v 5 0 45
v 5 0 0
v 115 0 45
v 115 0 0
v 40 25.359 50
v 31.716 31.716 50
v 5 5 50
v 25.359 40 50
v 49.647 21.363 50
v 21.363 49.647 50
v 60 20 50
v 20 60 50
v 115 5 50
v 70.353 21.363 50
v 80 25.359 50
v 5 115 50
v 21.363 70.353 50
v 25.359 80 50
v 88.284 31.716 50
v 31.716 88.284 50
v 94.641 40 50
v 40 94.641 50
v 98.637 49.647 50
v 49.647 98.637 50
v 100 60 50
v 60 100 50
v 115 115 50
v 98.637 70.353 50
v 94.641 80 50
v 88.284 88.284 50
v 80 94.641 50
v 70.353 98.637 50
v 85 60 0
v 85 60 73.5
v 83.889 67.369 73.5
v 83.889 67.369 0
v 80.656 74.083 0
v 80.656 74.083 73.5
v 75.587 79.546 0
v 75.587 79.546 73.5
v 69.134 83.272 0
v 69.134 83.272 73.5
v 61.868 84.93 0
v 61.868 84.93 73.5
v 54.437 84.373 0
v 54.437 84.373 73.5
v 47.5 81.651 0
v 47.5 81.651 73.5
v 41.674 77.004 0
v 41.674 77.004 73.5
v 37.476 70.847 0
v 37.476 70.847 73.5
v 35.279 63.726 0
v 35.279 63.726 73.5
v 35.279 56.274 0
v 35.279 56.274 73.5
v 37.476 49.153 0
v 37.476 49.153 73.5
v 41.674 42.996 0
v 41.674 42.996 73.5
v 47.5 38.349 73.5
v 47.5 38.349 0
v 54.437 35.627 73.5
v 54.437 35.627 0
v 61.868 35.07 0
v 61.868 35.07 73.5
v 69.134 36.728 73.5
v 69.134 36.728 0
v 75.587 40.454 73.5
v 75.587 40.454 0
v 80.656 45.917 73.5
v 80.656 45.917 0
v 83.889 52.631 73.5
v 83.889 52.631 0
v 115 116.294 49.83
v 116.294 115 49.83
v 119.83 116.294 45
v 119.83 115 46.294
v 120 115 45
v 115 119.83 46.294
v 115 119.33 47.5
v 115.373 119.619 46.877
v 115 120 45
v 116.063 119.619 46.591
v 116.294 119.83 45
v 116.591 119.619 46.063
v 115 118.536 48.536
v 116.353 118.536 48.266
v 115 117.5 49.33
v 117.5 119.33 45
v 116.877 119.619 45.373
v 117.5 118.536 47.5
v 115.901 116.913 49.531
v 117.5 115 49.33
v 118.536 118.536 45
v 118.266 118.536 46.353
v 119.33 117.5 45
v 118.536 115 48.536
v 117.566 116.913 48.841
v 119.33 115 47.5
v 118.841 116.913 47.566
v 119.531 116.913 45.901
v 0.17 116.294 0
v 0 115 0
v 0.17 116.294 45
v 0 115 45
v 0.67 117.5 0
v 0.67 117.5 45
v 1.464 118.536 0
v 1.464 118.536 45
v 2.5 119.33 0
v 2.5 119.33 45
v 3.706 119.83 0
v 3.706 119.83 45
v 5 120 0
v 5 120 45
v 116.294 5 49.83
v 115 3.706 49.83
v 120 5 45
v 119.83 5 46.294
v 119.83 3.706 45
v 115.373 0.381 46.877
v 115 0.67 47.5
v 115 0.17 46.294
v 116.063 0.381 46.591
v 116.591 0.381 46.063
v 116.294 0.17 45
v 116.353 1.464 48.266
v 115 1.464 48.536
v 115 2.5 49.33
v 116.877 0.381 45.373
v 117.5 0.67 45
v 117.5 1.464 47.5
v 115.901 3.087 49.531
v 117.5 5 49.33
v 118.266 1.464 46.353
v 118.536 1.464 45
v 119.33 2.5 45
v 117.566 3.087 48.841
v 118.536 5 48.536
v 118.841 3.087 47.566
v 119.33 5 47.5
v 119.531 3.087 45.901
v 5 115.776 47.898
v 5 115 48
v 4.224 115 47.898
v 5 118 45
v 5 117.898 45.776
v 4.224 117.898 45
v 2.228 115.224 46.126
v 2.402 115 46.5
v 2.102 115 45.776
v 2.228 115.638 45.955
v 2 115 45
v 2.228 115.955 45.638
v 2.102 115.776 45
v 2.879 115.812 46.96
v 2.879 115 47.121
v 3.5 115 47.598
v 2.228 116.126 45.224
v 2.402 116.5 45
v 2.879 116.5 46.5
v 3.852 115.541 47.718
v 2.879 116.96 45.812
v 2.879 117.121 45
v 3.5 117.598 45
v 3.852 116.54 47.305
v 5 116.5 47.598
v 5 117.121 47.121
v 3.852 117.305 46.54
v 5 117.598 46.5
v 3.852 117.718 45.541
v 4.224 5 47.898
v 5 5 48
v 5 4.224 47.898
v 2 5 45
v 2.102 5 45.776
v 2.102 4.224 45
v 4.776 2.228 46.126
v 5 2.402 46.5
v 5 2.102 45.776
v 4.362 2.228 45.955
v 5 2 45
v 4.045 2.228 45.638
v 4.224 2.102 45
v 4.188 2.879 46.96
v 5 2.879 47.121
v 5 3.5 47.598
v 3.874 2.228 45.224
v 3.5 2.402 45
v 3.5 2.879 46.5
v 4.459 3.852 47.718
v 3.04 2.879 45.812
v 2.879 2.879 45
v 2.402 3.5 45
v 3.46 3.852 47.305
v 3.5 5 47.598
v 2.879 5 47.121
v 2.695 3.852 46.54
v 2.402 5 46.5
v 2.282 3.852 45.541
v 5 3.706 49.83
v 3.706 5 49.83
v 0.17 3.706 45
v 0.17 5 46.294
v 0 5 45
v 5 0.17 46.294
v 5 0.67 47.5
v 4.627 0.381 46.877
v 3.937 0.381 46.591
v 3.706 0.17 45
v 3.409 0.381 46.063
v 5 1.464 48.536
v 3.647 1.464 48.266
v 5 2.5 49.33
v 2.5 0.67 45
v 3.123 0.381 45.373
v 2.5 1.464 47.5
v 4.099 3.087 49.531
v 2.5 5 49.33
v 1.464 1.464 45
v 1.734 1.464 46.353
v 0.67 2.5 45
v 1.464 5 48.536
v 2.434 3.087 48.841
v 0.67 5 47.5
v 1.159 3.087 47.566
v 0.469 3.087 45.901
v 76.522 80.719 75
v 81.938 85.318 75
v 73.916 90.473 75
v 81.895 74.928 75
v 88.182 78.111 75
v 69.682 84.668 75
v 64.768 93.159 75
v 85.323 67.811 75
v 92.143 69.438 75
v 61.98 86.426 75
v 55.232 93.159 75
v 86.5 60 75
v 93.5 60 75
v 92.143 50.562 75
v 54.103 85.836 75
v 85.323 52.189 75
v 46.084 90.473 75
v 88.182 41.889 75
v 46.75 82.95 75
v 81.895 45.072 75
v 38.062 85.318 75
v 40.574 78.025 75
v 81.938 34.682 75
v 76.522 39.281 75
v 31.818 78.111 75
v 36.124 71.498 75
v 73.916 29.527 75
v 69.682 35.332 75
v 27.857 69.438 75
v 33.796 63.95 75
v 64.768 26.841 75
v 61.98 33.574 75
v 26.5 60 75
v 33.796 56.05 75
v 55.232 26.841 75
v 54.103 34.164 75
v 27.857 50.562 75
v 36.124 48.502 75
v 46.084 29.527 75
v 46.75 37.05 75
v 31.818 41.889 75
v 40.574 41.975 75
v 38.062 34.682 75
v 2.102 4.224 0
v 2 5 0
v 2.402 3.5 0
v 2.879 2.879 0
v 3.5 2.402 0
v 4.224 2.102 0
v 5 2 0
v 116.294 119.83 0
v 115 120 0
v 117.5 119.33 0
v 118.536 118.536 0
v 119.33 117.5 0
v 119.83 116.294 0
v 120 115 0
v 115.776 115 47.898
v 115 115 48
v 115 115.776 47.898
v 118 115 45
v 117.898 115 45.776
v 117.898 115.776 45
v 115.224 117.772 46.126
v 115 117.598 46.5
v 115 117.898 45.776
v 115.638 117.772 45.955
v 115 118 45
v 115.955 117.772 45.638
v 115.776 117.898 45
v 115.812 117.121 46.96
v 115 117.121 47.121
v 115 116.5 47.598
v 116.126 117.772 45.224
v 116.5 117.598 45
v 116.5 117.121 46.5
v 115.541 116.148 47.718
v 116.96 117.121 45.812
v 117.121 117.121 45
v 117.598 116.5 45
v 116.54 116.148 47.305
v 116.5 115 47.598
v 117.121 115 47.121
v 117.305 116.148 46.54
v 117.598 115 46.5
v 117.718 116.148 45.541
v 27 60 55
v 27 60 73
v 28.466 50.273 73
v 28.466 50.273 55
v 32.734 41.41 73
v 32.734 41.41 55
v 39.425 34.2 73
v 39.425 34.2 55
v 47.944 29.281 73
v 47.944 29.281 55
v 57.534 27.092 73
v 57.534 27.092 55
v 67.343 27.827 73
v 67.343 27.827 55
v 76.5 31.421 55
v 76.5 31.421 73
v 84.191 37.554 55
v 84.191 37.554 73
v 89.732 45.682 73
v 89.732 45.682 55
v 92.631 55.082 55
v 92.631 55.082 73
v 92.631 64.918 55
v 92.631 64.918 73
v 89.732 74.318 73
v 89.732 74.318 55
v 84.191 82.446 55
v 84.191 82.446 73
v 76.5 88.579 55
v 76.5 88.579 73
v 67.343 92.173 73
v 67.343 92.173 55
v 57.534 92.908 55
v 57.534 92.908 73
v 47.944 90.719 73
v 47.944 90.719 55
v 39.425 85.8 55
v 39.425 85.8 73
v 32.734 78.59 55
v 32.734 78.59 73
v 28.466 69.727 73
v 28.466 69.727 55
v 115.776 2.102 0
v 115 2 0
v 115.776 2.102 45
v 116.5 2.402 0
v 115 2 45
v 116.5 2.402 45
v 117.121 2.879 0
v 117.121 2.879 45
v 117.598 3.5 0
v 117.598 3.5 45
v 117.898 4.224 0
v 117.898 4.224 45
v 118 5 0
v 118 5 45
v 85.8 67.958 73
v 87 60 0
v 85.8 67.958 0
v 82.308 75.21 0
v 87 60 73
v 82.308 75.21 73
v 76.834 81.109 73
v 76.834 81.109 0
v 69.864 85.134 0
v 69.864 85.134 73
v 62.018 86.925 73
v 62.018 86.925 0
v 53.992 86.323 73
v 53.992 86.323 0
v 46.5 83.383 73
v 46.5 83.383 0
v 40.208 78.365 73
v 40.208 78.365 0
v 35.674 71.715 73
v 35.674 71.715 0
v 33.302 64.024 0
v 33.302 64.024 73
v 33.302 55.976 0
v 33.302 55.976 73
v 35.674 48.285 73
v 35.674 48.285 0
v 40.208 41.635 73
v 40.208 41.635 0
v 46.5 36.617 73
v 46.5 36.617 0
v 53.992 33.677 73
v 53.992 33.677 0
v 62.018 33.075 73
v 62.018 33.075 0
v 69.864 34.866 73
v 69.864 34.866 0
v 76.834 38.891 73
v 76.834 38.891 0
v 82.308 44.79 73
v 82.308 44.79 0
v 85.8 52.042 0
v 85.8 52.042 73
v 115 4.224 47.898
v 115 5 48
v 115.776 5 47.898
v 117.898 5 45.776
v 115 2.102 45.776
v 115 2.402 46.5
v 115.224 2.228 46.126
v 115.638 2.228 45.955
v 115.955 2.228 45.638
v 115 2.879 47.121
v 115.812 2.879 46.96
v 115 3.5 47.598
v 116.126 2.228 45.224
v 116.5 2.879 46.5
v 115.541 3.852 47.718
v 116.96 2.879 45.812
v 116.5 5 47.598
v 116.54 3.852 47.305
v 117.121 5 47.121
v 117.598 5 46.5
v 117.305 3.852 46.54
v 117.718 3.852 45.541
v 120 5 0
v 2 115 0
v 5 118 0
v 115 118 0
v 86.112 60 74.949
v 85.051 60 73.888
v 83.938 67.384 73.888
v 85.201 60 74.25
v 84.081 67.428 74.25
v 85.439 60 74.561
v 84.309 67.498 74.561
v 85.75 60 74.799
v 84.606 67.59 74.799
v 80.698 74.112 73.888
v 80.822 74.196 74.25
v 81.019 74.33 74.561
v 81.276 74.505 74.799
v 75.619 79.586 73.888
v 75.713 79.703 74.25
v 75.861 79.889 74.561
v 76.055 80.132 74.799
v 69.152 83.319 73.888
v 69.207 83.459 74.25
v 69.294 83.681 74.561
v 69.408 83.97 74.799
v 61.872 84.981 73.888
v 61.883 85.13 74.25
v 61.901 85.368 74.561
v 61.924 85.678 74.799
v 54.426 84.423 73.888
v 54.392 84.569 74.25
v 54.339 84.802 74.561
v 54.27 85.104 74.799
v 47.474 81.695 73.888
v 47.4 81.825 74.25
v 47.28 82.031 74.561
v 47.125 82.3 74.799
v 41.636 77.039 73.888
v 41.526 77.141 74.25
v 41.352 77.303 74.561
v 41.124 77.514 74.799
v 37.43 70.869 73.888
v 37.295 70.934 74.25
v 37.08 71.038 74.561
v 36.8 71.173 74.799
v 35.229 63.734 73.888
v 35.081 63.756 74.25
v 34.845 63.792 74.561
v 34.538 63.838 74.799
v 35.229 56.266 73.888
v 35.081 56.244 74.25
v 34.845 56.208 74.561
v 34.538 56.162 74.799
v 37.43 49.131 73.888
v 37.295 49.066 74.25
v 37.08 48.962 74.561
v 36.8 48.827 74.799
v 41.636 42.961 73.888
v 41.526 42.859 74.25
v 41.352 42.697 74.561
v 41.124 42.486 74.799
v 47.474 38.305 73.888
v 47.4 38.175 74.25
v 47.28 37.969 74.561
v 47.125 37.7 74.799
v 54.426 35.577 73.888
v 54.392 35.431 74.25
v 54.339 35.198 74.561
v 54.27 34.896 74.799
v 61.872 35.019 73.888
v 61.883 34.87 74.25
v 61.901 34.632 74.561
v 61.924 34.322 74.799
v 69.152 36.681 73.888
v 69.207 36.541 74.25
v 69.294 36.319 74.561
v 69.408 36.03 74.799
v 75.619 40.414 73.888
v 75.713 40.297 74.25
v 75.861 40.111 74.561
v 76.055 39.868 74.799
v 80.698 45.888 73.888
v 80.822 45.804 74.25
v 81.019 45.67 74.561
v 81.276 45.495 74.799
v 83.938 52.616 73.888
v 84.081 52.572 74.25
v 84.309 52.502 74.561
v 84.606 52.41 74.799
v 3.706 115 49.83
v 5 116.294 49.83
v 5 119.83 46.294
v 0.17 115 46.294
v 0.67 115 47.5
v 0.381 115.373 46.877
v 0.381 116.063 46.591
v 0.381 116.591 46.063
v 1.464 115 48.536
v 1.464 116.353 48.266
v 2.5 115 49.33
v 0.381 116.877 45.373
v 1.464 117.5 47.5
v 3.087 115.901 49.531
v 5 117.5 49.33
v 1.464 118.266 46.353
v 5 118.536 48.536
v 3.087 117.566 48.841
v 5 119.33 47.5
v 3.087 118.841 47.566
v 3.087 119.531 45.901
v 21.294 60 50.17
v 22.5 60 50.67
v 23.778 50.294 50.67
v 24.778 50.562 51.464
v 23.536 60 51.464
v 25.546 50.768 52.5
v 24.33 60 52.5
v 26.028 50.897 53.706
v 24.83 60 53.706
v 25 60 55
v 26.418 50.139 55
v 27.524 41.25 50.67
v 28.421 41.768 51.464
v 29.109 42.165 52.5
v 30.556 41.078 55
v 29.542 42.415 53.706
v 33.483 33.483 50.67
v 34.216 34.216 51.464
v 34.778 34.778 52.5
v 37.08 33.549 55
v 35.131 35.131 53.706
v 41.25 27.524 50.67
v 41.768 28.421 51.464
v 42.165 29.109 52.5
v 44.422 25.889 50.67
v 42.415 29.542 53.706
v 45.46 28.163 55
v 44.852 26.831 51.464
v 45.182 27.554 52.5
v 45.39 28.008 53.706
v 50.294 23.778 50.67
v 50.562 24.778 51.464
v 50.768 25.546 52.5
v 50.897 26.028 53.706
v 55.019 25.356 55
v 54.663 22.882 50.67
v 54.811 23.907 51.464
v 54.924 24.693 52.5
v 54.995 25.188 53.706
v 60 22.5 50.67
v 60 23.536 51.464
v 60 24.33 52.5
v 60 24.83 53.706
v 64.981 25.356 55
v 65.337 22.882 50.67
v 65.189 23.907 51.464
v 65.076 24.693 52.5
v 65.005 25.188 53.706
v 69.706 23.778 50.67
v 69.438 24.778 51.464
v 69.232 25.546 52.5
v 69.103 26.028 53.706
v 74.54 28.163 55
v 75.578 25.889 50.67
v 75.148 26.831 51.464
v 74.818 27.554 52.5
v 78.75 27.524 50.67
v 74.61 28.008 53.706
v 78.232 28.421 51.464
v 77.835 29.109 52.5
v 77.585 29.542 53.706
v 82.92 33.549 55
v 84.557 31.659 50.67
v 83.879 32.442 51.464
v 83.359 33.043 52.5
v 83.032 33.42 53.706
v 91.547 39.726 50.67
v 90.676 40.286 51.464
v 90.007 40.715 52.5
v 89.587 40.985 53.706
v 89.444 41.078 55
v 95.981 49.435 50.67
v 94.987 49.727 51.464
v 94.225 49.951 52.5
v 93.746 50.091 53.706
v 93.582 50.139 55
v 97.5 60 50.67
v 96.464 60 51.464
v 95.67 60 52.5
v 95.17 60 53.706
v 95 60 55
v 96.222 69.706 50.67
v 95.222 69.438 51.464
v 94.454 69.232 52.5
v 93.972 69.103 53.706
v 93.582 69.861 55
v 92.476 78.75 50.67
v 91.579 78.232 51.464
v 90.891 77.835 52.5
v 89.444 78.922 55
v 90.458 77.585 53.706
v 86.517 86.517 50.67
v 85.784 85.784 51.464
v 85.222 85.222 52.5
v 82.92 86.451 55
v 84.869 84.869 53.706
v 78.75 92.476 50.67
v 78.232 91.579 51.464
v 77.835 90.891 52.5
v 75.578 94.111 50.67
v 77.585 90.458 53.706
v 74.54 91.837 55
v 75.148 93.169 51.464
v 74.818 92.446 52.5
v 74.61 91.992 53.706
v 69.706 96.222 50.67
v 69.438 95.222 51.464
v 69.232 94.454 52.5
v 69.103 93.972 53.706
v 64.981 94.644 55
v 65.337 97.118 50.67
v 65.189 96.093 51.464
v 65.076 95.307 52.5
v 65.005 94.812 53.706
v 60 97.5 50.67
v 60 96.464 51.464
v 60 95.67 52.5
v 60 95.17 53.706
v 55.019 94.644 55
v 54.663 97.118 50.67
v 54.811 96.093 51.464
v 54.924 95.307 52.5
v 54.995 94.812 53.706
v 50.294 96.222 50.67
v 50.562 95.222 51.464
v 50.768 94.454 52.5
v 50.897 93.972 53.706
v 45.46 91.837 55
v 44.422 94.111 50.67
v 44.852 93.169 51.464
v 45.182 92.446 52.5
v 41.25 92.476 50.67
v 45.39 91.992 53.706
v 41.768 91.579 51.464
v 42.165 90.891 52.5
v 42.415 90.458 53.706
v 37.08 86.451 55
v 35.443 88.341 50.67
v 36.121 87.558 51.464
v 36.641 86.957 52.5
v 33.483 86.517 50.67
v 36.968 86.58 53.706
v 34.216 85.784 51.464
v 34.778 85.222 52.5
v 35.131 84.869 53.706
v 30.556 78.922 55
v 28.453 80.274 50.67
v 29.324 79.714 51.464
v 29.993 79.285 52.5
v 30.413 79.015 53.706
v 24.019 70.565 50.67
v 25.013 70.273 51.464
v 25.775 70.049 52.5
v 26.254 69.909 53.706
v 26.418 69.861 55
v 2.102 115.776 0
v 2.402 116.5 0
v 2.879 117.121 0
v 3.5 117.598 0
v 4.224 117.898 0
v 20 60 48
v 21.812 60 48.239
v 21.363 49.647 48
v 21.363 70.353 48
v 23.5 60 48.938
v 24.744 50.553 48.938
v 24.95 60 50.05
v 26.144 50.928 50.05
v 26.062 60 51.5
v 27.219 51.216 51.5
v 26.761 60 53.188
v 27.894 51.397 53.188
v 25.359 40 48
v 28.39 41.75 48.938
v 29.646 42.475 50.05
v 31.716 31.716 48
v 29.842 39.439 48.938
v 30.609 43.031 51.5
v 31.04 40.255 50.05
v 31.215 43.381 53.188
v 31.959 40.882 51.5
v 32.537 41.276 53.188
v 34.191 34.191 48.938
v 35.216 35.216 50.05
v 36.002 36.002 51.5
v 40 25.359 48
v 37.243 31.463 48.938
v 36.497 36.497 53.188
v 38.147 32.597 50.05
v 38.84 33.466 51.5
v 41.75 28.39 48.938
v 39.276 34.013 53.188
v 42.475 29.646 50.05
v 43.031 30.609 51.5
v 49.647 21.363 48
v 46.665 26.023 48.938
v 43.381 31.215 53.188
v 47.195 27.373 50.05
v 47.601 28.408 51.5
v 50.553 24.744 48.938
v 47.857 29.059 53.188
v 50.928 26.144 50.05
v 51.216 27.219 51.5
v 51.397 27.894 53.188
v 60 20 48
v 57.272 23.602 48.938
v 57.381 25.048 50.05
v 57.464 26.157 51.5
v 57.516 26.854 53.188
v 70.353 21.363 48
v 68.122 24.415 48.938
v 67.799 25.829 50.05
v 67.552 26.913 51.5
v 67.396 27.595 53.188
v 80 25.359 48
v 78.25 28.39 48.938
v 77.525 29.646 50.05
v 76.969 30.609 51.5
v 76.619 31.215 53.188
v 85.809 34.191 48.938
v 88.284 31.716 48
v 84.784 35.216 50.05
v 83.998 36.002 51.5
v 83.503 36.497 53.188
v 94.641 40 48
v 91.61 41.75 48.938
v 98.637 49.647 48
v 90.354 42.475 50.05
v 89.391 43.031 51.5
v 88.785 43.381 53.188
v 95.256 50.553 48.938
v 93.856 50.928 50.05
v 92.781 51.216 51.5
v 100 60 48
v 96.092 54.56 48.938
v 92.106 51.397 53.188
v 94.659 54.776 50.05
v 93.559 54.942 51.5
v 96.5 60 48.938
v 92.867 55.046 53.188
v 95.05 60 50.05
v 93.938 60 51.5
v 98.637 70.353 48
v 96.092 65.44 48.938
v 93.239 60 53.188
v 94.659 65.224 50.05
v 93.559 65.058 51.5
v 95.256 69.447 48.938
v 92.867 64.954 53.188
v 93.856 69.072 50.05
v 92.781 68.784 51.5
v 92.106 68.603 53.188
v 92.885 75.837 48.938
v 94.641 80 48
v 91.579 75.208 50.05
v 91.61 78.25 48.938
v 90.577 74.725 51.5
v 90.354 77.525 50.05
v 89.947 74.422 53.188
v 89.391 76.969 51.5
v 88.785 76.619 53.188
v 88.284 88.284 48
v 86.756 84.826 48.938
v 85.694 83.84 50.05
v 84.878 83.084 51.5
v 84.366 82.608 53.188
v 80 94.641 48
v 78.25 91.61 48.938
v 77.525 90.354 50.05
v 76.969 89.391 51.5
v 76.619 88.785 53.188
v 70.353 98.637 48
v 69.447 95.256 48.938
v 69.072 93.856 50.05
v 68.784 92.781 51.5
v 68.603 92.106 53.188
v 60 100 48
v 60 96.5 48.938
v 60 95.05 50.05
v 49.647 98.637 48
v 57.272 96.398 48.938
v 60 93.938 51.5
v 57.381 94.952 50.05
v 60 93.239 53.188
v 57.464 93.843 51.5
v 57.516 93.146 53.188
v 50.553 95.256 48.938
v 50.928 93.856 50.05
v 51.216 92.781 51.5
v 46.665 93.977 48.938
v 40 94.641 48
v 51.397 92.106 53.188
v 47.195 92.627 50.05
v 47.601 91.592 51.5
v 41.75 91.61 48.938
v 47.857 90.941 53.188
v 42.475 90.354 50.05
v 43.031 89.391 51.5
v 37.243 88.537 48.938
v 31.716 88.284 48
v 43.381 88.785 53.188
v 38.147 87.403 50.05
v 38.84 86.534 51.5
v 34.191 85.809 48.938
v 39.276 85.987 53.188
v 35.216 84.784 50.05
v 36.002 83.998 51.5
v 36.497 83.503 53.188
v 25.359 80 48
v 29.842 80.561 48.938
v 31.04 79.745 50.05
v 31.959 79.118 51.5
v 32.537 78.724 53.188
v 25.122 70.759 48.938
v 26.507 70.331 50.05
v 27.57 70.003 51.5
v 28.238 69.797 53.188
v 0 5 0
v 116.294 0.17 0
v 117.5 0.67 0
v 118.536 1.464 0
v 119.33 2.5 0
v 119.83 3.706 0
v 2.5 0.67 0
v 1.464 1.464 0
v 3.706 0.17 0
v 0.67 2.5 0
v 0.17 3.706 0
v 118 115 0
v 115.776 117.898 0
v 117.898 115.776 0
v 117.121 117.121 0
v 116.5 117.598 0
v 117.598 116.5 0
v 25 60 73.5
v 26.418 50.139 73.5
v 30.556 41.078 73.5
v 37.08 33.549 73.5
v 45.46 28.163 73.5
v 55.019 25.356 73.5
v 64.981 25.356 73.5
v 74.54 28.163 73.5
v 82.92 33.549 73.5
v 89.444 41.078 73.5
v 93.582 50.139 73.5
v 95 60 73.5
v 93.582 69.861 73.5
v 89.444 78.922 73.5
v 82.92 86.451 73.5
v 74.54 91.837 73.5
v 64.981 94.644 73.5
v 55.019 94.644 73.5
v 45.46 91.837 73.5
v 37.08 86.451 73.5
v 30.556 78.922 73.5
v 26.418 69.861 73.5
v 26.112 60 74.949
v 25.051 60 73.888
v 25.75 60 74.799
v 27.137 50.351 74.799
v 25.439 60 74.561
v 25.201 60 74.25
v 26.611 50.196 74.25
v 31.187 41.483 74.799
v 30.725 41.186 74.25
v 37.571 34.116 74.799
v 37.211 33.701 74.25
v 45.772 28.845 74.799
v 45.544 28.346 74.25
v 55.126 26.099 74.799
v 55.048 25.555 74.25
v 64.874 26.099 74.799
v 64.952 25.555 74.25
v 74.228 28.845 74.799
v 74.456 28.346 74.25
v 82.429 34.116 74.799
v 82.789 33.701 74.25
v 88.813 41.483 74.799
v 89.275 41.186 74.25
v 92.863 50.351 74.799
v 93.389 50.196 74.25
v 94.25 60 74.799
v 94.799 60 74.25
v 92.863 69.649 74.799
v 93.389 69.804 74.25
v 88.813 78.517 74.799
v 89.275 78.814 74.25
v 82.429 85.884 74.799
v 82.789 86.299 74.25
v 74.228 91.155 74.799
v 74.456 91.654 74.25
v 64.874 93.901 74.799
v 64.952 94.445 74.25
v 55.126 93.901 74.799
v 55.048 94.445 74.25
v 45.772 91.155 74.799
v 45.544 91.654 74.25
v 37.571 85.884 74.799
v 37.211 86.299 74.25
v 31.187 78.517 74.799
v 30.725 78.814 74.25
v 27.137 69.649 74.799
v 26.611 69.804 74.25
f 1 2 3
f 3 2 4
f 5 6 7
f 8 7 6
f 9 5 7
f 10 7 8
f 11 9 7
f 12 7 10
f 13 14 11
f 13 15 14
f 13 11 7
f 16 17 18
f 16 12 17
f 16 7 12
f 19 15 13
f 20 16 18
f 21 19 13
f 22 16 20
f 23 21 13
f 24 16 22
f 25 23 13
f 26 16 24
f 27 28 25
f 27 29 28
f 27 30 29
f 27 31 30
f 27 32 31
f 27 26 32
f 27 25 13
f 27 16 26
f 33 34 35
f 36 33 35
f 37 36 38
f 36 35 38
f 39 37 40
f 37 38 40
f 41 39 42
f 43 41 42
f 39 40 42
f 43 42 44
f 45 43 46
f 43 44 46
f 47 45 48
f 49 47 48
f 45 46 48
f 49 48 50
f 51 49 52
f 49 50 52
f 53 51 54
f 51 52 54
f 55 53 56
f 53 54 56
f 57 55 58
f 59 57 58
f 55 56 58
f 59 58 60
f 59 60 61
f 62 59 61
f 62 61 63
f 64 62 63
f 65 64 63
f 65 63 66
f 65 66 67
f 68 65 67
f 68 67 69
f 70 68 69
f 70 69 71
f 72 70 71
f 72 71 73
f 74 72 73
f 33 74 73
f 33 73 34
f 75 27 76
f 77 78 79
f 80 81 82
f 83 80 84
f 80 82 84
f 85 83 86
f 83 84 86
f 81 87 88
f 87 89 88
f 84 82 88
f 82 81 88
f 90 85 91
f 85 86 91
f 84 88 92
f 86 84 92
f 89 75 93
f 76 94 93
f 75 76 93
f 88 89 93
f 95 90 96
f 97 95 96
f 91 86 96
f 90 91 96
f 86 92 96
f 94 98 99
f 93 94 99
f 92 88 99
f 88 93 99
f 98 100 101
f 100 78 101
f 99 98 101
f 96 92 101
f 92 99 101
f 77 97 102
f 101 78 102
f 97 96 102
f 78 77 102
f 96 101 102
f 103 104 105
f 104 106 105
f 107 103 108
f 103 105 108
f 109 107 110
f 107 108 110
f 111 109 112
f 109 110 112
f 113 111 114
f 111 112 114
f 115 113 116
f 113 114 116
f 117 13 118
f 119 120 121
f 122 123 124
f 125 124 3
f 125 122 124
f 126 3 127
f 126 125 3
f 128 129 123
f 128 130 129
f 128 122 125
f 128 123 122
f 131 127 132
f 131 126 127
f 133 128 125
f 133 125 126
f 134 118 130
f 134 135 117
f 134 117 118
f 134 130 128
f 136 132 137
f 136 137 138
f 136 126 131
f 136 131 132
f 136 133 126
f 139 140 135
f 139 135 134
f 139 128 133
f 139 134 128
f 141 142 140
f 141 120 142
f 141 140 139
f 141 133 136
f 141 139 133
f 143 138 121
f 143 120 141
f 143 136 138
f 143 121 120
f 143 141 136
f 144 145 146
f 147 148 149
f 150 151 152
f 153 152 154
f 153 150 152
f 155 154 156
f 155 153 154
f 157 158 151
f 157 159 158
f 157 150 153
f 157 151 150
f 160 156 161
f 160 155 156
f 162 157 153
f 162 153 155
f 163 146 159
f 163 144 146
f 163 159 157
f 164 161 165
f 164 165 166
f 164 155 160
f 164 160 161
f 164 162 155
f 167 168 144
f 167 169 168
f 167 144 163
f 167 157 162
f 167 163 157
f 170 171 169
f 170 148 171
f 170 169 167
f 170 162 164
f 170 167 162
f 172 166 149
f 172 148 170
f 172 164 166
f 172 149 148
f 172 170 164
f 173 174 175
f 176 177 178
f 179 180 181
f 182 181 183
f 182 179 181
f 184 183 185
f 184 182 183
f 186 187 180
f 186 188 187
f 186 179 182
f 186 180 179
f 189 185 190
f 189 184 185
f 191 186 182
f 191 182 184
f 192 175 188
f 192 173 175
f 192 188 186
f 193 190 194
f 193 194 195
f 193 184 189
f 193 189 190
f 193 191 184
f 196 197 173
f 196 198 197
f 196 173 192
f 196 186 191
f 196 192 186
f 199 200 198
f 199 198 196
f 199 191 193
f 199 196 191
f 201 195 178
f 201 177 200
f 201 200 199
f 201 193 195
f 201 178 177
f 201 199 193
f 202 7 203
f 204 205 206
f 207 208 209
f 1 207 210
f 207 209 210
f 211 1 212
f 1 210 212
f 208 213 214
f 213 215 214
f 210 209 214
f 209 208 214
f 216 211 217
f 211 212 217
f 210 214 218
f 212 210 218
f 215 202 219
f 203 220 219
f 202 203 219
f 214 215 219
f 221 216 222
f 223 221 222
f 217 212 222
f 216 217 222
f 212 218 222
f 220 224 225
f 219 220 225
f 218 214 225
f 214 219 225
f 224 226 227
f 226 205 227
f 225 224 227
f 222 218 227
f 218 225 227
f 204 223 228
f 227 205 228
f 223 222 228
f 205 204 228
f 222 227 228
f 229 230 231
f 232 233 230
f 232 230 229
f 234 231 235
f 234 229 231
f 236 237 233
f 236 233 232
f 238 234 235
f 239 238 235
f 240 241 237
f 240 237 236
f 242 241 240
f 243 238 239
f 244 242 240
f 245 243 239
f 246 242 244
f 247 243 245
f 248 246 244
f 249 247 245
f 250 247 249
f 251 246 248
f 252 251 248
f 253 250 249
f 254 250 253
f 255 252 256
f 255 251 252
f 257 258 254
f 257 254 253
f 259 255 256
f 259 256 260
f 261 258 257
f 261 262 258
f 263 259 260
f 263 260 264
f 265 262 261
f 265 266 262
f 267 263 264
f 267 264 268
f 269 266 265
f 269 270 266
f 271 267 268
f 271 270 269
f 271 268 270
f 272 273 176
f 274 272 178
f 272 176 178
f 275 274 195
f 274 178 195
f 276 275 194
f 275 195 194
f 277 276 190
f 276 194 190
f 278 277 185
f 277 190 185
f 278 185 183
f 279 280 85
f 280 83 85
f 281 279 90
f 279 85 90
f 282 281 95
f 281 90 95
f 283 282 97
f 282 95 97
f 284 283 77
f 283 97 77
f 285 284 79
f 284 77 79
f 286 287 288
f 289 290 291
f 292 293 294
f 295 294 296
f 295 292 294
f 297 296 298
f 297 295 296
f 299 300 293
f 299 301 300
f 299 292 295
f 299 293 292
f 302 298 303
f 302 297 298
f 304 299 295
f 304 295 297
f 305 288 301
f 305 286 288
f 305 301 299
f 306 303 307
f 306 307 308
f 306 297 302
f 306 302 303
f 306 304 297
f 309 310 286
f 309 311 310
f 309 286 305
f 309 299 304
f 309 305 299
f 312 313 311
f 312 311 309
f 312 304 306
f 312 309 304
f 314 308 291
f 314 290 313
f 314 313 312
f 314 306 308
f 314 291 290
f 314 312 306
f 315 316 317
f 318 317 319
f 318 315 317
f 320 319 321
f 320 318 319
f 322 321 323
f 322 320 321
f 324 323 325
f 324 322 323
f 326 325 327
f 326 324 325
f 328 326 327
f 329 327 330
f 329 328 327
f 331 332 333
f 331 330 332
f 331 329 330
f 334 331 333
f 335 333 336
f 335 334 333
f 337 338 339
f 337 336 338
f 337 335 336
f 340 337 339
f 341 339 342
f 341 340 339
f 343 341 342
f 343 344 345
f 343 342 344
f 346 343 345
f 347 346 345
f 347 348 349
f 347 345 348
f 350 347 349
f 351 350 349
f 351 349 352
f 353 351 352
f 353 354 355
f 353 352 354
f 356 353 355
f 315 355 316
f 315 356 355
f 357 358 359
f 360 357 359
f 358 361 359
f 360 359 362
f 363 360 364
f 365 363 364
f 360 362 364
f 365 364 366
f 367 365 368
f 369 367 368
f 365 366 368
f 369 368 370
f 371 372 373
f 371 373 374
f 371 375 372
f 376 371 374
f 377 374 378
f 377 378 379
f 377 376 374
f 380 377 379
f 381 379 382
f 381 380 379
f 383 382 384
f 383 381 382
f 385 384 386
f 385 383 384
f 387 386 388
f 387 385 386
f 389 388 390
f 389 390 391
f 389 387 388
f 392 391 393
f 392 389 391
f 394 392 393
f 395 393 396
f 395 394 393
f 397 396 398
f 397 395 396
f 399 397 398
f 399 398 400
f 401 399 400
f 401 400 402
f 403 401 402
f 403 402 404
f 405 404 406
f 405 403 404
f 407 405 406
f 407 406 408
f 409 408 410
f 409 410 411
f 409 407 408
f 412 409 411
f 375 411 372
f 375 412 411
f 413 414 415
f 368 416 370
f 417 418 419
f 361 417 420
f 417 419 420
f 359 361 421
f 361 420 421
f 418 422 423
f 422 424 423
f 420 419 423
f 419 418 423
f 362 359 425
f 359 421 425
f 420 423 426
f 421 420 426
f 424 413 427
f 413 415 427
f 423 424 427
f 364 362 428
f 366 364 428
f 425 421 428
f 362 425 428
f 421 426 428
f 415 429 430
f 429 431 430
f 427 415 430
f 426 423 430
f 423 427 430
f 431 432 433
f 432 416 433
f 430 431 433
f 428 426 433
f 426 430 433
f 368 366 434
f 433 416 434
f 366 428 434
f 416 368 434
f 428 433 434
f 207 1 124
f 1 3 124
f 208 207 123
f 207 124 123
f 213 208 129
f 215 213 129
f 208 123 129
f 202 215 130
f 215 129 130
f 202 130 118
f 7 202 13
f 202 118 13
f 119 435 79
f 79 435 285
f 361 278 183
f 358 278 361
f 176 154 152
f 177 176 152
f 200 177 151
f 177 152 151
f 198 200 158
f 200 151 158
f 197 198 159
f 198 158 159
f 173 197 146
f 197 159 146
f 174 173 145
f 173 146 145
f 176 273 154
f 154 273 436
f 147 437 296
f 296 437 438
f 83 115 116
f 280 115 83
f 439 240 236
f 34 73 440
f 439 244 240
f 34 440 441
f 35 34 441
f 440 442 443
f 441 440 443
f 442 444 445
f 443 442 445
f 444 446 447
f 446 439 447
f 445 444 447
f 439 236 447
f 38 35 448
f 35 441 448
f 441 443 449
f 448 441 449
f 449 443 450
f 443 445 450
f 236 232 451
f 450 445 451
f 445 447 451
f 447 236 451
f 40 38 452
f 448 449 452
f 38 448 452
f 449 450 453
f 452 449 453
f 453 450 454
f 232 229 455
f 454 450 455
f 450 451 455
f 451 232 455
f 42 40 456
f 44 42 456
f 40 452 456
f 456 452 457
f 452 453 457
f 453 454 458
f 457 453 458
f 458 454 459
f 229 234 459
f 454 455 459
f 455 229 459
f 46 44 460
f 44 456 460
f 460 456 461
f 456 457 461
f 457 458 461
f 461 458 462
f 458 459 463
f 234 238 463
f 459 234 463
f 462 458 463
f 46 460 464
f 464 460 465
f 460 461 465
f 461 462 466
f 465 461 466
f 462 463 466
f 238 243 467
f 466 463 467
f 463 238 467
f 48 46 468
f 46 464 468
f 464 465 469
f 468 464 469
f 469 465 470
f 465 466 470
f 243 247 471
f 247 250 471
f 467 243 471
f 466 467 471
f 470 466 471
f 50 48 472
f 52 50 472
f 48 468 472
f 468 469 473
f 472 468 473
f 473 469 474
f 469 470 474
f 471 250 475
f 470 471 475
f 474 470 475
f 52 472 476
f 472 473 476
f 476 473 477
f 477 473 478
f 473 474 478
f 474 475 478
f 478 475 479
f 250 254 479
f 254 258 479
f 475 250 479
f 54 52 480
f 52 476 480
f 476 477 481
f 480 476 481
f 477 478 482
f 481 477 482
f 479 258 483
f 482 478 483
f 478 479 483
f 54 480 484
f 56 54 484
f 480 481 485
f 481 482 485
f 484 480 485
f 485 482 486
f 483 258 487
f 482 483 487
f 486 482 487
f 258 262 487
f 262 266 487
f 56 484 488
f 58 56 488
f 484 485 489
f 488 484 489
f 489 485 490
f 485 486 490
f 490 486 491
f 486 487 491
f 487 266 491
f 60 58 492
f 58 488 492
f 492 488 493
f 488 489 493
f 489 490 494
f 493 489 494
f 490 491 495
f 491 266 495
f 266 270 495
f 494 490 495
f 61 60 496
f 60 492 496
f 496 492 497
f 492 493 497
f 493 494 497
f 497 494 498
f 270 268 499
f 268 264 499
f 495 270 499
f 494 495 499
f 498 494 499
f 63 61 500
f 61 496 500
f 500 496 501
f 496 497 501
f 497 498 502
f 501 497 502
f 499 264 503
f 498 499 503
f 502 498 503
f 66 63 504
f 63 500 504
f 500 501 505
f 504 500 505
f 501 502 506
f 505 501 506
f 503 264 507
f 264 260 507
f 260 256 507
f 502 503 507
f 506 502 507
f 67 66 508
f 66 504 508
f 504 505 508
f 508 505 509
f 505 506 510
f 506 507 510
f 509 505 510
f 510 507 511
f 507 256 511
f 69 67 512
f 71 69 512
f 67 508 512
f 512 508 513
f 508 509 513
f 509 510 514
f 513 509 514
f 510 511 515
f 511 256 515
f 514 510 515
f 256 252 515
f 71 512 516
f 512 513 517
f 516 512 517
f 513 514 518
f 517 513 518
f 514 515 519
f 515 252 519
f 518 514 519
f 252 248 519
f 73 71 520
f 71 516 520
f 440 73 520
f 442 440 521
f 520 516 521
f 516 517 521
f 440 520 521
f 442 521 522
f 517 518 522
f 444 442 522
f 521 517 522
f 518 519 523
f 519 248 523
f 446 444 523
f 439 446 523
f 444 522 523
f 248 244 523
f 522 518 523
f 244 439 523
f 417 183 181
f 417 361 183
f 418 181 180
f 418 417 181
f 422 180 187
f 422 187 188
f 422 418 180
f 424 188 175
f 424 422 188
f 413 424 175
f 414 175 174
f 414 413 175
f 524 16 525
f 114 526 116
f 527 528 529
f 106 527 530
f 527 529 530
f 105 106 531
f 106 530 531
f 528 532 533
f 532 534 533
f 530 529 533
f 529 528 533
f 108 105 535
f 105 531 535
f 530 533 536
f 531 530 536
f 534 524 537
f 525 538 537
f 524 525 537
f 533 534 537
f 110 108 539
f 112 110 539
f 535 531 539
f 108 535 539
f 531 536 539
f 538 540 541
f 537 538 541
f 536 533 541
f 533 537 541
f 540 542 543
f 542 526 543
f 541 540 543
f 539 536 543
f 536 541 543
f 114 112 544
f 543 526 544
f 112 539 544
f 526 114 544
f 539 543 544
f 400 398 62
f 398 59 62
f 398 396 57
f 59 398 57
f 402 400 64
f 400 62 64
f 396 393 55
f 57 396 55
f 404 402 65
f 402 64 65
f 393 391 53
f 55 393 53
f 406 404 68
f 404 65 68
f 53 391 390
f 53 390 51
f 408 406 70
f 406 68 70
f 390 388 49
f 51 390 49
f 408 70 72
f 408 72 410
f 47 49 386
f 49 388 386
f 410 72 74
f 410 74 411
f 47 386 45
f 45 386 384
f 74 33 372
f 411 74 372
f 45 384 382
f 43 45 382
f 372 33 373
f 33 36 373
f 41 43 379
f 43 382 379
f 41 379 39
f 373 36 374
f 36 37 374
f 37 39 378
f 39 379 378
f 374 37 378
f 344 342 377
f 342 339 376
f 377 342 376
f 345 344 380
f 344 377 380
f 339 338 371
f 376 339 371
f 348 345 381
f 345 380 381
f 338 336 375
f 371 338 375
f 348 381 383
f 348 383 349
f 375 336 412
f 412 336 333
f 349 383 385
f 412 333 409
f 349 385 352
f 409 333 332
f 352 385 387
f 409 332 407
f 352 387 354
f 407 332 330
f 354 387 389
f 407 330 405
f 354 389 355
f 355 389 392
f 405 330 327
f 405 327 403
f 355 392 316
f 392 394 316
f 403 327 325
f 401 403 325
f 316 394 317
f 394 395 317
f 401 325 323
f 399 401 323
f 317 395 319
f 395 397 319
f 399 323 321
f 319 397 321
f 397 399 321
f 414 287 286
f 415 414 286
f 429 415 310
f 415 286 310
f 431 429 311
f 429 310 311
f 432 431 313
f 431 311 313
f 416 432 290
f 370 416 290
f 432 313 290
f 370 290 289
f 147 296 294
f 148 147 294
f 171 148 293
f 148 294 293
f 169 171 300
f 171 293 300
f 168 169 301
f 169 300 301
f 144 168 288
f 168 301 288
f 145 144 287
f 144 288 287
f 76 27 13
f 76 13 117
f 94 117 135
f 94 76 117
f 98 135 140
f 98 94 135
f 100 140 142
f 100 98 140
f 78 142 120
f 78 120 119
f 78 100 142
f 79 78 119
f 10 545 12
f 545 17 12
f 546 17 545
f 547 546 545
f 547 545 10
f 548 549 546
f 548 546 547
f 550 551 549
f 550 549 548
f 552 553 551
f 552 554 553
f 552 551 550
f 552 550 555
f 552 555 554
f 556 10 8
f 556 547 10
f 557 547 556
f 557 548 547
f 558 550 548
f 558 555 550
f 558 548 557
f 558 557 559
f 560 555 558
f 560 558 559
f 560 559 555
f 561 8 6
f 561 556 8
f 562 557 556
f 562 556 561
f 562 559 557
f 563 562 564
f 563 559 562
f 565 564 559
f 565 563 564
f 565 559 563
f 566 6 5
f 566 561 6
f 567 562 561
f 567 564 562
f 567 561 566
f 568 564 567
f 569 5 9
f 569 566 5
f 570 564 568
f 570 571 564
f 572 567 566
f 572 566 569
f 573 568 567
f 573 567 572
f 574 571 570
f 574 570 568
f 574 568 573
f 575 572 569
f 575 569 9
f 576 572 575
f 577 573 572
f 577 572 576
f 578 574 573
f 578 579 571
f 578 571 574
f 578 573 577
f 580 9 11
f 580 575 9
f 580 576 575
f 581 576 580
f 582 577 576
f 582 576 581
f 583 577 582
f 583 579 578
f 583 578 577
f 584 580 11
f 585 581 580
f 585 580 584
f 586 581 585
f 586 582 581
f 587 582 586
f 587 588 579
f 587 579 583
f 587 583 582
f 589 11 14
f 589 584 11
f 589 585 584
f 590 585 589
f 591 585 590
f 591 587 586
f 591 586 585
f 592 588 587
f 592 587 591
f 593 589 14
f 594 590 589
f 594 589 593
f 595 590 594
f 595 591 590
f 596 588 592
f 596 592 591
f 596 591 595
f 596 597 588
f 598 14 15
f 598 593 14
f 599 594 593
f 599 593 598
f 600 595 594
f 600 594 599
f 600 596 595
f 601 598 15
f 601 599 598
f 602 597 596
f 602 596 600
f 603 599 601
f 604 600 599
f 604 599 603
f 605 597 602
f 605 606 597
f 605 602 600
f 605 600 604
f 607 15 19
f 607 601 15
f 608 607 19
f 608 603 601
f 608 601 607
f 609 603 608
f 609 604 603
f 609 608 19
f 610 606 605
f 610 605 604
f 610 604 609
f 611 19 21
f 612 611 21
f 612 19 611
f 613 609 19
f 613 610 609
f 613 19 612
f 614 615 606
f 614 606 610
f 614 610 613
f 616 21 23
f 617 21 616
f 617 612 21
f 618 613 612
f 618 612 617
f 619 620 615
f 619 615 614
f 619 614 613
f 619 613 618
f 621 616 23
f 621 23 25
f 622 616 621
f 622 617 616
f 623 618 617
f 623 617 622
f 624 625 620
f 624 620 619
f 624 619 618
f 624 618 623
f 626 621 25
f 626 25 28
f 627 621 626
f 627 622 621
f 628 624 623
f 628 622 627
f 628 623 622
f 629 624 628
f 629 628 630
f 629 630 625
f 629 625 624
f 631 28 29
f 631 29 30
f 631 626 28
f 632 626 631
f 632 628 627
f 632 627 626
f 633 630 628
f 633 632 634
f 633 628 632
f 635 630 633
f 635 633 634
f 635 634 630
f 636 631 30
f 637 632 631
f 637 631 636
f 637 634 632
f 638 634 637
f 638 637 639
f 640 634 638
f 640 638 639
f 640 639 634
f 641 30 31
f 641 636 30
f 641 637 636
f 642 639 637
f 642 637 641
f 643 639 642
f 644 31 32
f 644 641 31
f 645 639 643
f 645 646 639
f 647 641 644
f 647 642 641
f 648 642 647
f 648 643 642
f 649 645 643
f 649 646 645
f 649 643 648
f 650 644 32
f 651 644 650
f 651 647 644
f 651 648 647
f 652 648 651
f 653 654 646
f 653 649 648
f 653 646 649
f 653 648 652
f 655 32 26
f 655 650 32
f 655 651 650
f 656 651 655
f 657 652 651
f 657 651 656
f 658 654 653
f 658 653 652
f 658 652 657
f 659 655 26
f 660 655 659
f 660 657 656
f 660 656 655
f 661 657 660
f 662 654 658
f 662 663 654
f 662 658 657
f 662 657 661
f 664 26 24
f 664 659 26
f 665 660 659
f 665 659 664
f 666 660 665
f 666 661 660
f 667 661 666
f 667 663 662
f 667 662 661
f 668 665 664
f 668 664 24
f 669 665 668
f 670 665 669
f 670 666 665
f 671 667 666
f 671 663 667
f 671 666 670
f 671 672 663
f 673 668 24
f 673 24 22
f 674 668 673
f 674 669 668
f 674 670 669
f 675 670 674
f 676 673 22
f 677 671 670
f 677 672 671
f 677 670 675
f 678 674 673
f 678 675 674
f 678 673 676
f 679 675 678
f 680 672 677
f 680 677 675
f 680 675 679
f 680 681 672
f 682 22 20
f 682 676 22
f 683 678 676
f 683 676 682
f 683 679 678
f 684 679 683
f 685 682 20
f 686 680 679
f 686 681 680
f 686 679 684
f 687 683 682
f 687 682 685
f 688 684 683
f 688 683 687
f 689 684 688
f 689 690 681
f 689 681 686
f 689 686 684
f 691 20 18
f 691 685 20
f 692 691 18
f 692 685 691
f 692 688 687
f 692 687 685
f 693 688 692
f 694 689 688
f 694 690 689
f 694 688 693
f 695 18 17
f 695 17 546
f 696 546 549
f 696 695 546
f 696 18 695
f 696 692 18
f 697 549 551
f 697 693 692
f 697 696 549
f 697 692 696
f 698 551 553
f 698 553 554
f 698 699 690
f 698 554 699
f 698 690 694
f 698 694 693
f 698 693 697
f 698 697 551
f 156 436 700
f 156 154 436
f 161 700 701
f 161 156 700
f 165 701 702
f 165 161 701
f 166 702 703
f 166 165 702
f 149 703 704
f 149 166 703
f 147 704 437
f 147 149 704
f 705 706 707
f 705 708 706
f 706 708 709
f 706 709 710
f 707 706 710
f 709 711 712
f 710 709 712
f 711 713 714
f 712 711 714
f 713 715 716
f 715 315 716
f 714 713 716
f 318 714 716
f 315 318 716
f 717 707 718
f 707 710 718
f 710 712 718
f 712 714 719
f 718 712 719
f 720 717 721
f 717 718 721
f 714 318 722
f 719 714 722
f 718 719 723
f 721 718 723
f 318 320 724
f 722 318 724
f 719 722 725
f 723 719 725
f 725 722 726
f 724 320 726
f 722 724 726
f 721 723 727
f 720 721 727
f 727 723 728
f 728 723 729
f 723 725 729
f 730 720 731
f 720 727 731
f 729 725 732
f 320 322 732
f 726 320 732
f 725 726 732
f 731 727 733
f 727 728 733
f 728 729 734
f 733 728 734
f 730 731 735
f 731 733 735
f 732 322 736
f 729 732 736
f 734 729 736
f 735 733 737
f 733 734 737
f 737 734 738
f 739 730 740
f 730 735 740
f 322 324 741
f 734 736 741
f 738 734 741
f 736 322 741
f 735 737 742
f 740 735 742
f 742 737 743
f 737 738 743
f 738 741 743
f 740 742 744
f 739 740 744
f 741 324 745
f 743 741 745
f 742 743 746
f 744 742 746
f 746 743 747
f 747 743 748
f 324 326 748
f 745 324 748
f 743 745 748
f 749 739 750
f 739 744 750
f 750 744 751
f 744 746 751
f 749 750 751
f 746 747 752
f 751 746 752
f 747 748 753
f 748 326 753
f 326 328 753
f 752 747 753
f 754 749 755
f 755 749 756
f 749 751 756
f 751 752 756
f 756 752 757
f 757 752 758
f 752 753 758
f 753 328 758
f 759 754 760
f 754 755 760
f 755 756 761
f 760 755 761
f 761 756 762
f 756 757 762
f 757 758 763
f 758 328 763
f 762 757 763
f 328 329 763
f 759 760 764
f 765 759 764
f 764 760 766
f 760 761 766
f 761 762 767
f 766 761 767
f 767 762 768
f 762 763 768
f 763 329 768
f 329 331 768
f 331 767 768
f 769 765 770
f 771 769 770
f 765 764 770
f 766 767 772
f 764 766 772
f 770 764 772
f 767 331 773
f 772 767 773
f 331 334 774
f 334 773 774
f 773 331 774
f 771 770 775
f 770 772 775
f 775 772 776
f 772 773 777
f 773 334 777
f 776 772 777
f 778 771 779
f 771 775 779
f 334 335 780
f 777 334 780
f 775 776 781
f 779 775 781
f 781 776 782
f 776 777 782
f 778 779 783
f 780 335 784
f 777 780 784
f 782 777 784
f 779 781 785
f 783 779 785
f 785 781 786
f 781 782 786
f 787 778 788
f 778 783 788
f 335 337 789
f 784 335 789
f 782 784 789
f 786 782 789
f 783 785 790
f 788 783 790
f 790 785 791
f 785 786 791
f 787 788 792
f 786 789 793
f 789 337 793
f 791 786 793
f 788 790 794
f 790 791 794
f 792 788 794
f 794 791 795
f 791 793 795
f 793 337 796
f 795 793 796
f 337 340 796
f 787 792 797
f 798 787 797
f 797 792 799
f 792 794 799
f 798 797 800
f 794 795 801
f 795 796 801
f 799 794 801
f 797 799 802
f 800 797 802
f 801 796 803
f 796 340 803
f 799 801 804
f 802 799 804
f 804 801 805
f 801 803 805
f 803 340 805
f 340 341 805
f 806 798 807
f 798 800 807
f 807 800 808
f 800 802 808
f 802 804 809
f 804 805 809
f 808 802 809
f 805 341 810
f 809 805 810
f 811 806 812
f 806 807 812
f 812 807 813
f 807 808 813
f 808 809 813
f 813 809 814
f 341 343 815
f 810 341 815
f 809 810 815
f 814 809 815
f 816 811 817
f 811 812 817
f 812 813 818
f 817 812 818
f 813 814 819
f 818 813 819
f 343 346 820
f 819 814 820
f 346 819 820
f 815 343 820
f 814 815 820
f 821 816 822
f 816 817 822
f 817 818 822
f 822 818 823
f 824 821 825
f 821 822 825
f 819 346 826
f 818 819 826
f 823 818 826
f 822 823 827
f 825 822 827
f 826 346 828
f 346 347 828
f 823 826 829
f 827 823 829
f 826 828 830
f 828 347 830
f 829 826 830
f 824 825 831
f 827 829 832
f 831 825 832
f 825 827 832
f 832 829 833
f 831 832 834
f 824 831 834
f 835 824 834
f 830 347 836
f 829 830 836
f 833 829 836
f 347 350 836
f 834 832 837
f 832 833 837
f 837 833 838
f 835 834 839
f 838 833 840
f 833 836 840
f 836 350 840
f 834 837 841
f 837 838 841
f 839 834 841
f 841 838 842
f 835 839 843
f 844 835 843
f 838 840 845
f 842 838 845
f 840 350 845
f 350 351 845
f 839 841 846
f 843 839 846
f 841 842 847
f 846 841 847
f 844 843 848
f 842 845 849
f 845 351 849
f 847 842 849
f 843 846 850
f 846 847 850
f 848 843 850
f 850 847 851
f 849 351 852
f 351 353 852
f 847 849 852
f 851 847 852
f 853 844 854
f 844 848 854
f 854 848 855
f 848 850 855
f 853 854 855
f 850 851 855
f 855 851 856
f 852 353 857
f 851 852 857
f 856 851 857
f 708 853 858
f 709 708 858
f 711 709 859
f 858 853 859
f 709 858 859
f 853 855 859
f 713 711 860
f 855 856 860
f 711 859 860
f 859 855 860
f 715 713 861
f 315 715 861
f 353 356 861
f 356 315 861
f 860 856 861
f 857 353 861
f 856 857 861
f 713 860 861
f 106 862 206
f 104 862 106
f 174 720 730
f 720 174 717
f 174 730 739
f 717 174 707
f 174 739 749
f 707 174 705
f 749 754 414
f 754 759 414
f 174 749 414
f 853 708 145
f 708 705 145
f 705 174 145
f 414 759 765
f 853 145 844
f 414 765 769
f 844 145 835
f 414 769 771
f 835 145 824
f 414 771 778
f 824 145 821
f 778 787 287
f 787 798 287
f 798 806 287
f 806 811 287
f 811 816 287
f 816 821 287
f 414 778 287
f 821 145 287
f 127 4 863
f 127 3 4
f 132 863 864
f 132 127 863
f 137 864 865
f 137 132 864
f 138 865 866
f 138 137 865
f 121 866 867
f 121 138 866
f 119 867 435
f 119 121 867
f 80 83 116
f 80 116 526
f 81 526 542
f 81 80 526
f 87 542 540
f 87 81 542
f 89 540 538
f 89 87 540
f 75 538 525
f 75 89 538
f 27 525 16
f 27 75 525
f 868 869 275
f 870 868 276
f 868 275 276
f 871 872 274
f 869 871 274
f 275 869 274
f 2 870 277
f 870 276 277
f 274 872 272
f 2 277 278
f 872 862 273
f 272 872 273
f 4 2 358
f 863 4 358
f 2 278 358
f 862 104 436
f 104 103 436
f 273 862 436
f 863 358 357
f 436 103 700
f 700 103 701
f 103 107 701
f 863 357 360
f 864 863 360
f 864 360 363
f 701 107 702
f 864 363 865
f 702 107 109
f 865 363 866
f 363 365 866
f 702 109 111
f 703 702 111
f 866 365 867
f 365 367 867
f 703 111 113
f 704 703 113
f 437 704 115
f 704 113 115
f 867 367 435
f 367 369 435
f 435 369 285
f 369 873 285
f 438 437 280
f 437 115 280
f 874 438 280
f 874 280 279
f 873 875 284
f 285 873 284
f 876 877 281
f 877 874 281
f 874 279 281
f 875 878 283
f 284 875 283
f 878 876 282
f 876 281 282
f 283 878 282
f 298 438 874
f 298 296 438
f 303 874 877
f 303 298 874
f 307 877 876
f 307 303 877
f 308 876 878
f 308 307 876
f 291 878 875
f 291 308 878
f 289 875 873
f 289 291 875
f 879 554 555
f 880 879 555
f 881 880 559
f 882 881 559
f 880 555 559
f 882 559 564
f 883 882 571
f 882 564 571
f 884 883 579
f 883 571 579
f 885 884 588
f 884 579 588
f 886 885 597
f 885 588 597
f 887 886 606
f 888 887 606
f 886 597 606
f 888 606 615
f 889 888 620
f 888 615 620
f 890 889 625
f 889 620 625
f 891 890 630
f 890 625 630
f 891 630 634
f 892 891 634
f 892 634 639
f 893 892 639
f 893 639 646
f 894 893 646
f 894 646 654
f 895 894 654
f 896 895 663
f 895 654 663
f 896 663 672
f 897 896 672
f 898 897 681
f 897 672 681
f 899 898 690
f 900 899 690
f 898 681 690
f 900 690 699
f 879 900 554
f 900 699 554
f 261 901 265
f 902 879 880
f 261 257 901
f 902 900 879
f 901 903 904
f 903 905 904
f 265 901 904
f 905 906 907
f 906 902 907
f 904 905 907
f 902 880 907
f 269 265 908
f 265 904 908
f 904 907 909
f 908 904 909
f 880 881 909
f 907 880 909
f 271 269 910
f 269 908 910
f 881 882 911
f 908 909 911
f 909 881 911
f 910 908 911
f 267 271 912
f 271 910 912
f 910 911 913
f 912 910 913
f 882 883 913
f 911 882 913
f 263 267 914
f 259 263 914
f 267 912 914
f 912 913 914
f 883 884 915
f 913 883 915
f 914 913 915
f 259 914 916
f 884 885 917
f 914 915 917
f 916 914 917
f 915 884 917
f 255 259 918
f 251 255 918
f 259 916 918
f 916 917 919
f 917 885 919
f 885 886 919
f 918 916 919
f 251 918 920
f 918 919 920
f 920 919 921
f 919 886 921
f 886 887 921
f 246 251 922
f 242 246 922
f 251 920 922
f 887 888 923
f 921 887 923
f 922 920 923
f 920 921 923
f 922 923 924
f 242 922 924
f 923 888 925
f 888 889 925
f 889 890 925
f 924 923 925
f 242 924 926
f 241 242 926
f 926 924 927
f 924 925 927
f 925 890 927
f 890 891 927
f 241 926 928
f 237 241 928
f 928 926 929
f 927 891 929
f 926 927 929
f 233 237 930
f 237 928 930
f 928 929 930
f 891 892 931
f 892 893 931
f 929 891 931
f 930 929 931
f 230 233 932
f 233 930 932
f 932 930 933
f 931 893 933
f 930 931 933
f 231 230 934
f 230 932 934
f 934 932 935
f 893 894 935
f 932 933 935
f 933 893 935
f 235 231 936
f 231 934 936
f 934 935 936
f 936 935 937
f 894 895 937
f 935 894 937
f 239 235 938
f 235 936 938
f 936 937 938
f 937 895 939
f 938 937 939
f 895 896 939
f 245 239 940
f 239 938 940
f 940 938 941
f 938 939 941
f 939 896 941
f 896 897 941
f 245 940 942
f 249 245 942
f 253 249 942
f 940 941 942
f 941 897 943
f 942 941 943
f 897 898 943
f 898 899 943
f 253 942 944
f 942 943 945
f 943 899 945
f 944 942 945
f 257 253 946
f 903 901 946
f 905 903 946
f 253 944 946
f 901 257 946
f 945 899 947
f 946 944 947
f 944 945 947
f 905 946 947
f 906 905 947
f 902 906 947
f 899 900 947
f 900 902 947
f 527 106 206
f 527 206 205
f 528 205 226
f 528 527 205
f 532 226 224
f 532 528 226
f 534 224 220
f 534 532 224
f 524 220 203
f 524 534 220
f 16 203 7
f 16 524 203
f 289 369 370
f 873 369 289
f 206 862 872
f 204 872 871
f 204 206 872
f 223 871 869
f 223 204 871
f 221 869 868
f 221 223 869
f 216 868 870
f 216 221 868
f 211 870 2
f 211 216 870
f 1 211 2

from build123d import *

# Parameters (mm, degrees)
SKETCH2_W           = 120
SKETCH2_H           = 120
BOSS_EXTRUDE1_DEPTH = 50
SKETCH4_R           = 35
BOSS_EXTRUDE2_DEPTH = 25
SKETCH6_R           = 25
CUT_EXTRUDE1_DEPTH  = 186.539753153
FILLET1_R           = 5
FILLET2_R           = 1.5
SHELL1_T            = -2


with BuildPart() as part:
    # Sketch2 → Boss-Extrude1 (new body)
    with BuildSketch(Plane.XY):
        with Locations((60, 60)):
            Rectangle(SKETCH2_W, SKETCH2_H)
    extrude(amount=BOSS_EXTRUDE1_DEPTH)

    # Sketch4 → Boss-Extrude2 (add)
    with BuildSketch(Plane.XY.offset(50)):
        with Locations(Location((60, 60, 0), (0, 0, 180))):
            Circle(SKETCH4_R)
    extrude(amount=BOSS_EXTRUDE2_DEPTH)

    # Sketch6 → Cut-Extrude1 (cut, through all)
    with BuildSketch(Plane.XY.offset(75)):
        with Locations((60, 60)):
            Circle(SKETCH6_R)
    extrude(amount=-CUT_EXTRUDE1_DEPTH, mode=Mode.SUBTRACT)

    # Fillet1
    fillet1_edges = [part.edges().sort_by_distance(p)[0] for p in [
        (120, 60, 50),
        (60, 120, 50),
        (95, 60, 50),
        (0, 60, 50),
        (60, 0, 50),
        (0, 120, 25),
        (120, 120, 25),
        (120, 0, 25),
        (0, 0, 25),
    ]]
    fillet(fillet1_edges, radius=FILLET1_R)

    # Fillet2
    fillet2_edges = [part.edges().sort_by_distance(p)[0] for p in [
        (95, 60, 75),
        (35, 60, 75),
    ]]
    fillet(fillet2_edges, radius=FILLET2_R)

    # Shell1
    shell1_openings = [part.faces().sort_by_distance(p)[0] for p in [
        (60, 1.697056275, 0),
    ]]
    offset(amount=SHELL1_T, openings=shell1_openings, kind=Kind.INTERSECTION)


solid = part.part
